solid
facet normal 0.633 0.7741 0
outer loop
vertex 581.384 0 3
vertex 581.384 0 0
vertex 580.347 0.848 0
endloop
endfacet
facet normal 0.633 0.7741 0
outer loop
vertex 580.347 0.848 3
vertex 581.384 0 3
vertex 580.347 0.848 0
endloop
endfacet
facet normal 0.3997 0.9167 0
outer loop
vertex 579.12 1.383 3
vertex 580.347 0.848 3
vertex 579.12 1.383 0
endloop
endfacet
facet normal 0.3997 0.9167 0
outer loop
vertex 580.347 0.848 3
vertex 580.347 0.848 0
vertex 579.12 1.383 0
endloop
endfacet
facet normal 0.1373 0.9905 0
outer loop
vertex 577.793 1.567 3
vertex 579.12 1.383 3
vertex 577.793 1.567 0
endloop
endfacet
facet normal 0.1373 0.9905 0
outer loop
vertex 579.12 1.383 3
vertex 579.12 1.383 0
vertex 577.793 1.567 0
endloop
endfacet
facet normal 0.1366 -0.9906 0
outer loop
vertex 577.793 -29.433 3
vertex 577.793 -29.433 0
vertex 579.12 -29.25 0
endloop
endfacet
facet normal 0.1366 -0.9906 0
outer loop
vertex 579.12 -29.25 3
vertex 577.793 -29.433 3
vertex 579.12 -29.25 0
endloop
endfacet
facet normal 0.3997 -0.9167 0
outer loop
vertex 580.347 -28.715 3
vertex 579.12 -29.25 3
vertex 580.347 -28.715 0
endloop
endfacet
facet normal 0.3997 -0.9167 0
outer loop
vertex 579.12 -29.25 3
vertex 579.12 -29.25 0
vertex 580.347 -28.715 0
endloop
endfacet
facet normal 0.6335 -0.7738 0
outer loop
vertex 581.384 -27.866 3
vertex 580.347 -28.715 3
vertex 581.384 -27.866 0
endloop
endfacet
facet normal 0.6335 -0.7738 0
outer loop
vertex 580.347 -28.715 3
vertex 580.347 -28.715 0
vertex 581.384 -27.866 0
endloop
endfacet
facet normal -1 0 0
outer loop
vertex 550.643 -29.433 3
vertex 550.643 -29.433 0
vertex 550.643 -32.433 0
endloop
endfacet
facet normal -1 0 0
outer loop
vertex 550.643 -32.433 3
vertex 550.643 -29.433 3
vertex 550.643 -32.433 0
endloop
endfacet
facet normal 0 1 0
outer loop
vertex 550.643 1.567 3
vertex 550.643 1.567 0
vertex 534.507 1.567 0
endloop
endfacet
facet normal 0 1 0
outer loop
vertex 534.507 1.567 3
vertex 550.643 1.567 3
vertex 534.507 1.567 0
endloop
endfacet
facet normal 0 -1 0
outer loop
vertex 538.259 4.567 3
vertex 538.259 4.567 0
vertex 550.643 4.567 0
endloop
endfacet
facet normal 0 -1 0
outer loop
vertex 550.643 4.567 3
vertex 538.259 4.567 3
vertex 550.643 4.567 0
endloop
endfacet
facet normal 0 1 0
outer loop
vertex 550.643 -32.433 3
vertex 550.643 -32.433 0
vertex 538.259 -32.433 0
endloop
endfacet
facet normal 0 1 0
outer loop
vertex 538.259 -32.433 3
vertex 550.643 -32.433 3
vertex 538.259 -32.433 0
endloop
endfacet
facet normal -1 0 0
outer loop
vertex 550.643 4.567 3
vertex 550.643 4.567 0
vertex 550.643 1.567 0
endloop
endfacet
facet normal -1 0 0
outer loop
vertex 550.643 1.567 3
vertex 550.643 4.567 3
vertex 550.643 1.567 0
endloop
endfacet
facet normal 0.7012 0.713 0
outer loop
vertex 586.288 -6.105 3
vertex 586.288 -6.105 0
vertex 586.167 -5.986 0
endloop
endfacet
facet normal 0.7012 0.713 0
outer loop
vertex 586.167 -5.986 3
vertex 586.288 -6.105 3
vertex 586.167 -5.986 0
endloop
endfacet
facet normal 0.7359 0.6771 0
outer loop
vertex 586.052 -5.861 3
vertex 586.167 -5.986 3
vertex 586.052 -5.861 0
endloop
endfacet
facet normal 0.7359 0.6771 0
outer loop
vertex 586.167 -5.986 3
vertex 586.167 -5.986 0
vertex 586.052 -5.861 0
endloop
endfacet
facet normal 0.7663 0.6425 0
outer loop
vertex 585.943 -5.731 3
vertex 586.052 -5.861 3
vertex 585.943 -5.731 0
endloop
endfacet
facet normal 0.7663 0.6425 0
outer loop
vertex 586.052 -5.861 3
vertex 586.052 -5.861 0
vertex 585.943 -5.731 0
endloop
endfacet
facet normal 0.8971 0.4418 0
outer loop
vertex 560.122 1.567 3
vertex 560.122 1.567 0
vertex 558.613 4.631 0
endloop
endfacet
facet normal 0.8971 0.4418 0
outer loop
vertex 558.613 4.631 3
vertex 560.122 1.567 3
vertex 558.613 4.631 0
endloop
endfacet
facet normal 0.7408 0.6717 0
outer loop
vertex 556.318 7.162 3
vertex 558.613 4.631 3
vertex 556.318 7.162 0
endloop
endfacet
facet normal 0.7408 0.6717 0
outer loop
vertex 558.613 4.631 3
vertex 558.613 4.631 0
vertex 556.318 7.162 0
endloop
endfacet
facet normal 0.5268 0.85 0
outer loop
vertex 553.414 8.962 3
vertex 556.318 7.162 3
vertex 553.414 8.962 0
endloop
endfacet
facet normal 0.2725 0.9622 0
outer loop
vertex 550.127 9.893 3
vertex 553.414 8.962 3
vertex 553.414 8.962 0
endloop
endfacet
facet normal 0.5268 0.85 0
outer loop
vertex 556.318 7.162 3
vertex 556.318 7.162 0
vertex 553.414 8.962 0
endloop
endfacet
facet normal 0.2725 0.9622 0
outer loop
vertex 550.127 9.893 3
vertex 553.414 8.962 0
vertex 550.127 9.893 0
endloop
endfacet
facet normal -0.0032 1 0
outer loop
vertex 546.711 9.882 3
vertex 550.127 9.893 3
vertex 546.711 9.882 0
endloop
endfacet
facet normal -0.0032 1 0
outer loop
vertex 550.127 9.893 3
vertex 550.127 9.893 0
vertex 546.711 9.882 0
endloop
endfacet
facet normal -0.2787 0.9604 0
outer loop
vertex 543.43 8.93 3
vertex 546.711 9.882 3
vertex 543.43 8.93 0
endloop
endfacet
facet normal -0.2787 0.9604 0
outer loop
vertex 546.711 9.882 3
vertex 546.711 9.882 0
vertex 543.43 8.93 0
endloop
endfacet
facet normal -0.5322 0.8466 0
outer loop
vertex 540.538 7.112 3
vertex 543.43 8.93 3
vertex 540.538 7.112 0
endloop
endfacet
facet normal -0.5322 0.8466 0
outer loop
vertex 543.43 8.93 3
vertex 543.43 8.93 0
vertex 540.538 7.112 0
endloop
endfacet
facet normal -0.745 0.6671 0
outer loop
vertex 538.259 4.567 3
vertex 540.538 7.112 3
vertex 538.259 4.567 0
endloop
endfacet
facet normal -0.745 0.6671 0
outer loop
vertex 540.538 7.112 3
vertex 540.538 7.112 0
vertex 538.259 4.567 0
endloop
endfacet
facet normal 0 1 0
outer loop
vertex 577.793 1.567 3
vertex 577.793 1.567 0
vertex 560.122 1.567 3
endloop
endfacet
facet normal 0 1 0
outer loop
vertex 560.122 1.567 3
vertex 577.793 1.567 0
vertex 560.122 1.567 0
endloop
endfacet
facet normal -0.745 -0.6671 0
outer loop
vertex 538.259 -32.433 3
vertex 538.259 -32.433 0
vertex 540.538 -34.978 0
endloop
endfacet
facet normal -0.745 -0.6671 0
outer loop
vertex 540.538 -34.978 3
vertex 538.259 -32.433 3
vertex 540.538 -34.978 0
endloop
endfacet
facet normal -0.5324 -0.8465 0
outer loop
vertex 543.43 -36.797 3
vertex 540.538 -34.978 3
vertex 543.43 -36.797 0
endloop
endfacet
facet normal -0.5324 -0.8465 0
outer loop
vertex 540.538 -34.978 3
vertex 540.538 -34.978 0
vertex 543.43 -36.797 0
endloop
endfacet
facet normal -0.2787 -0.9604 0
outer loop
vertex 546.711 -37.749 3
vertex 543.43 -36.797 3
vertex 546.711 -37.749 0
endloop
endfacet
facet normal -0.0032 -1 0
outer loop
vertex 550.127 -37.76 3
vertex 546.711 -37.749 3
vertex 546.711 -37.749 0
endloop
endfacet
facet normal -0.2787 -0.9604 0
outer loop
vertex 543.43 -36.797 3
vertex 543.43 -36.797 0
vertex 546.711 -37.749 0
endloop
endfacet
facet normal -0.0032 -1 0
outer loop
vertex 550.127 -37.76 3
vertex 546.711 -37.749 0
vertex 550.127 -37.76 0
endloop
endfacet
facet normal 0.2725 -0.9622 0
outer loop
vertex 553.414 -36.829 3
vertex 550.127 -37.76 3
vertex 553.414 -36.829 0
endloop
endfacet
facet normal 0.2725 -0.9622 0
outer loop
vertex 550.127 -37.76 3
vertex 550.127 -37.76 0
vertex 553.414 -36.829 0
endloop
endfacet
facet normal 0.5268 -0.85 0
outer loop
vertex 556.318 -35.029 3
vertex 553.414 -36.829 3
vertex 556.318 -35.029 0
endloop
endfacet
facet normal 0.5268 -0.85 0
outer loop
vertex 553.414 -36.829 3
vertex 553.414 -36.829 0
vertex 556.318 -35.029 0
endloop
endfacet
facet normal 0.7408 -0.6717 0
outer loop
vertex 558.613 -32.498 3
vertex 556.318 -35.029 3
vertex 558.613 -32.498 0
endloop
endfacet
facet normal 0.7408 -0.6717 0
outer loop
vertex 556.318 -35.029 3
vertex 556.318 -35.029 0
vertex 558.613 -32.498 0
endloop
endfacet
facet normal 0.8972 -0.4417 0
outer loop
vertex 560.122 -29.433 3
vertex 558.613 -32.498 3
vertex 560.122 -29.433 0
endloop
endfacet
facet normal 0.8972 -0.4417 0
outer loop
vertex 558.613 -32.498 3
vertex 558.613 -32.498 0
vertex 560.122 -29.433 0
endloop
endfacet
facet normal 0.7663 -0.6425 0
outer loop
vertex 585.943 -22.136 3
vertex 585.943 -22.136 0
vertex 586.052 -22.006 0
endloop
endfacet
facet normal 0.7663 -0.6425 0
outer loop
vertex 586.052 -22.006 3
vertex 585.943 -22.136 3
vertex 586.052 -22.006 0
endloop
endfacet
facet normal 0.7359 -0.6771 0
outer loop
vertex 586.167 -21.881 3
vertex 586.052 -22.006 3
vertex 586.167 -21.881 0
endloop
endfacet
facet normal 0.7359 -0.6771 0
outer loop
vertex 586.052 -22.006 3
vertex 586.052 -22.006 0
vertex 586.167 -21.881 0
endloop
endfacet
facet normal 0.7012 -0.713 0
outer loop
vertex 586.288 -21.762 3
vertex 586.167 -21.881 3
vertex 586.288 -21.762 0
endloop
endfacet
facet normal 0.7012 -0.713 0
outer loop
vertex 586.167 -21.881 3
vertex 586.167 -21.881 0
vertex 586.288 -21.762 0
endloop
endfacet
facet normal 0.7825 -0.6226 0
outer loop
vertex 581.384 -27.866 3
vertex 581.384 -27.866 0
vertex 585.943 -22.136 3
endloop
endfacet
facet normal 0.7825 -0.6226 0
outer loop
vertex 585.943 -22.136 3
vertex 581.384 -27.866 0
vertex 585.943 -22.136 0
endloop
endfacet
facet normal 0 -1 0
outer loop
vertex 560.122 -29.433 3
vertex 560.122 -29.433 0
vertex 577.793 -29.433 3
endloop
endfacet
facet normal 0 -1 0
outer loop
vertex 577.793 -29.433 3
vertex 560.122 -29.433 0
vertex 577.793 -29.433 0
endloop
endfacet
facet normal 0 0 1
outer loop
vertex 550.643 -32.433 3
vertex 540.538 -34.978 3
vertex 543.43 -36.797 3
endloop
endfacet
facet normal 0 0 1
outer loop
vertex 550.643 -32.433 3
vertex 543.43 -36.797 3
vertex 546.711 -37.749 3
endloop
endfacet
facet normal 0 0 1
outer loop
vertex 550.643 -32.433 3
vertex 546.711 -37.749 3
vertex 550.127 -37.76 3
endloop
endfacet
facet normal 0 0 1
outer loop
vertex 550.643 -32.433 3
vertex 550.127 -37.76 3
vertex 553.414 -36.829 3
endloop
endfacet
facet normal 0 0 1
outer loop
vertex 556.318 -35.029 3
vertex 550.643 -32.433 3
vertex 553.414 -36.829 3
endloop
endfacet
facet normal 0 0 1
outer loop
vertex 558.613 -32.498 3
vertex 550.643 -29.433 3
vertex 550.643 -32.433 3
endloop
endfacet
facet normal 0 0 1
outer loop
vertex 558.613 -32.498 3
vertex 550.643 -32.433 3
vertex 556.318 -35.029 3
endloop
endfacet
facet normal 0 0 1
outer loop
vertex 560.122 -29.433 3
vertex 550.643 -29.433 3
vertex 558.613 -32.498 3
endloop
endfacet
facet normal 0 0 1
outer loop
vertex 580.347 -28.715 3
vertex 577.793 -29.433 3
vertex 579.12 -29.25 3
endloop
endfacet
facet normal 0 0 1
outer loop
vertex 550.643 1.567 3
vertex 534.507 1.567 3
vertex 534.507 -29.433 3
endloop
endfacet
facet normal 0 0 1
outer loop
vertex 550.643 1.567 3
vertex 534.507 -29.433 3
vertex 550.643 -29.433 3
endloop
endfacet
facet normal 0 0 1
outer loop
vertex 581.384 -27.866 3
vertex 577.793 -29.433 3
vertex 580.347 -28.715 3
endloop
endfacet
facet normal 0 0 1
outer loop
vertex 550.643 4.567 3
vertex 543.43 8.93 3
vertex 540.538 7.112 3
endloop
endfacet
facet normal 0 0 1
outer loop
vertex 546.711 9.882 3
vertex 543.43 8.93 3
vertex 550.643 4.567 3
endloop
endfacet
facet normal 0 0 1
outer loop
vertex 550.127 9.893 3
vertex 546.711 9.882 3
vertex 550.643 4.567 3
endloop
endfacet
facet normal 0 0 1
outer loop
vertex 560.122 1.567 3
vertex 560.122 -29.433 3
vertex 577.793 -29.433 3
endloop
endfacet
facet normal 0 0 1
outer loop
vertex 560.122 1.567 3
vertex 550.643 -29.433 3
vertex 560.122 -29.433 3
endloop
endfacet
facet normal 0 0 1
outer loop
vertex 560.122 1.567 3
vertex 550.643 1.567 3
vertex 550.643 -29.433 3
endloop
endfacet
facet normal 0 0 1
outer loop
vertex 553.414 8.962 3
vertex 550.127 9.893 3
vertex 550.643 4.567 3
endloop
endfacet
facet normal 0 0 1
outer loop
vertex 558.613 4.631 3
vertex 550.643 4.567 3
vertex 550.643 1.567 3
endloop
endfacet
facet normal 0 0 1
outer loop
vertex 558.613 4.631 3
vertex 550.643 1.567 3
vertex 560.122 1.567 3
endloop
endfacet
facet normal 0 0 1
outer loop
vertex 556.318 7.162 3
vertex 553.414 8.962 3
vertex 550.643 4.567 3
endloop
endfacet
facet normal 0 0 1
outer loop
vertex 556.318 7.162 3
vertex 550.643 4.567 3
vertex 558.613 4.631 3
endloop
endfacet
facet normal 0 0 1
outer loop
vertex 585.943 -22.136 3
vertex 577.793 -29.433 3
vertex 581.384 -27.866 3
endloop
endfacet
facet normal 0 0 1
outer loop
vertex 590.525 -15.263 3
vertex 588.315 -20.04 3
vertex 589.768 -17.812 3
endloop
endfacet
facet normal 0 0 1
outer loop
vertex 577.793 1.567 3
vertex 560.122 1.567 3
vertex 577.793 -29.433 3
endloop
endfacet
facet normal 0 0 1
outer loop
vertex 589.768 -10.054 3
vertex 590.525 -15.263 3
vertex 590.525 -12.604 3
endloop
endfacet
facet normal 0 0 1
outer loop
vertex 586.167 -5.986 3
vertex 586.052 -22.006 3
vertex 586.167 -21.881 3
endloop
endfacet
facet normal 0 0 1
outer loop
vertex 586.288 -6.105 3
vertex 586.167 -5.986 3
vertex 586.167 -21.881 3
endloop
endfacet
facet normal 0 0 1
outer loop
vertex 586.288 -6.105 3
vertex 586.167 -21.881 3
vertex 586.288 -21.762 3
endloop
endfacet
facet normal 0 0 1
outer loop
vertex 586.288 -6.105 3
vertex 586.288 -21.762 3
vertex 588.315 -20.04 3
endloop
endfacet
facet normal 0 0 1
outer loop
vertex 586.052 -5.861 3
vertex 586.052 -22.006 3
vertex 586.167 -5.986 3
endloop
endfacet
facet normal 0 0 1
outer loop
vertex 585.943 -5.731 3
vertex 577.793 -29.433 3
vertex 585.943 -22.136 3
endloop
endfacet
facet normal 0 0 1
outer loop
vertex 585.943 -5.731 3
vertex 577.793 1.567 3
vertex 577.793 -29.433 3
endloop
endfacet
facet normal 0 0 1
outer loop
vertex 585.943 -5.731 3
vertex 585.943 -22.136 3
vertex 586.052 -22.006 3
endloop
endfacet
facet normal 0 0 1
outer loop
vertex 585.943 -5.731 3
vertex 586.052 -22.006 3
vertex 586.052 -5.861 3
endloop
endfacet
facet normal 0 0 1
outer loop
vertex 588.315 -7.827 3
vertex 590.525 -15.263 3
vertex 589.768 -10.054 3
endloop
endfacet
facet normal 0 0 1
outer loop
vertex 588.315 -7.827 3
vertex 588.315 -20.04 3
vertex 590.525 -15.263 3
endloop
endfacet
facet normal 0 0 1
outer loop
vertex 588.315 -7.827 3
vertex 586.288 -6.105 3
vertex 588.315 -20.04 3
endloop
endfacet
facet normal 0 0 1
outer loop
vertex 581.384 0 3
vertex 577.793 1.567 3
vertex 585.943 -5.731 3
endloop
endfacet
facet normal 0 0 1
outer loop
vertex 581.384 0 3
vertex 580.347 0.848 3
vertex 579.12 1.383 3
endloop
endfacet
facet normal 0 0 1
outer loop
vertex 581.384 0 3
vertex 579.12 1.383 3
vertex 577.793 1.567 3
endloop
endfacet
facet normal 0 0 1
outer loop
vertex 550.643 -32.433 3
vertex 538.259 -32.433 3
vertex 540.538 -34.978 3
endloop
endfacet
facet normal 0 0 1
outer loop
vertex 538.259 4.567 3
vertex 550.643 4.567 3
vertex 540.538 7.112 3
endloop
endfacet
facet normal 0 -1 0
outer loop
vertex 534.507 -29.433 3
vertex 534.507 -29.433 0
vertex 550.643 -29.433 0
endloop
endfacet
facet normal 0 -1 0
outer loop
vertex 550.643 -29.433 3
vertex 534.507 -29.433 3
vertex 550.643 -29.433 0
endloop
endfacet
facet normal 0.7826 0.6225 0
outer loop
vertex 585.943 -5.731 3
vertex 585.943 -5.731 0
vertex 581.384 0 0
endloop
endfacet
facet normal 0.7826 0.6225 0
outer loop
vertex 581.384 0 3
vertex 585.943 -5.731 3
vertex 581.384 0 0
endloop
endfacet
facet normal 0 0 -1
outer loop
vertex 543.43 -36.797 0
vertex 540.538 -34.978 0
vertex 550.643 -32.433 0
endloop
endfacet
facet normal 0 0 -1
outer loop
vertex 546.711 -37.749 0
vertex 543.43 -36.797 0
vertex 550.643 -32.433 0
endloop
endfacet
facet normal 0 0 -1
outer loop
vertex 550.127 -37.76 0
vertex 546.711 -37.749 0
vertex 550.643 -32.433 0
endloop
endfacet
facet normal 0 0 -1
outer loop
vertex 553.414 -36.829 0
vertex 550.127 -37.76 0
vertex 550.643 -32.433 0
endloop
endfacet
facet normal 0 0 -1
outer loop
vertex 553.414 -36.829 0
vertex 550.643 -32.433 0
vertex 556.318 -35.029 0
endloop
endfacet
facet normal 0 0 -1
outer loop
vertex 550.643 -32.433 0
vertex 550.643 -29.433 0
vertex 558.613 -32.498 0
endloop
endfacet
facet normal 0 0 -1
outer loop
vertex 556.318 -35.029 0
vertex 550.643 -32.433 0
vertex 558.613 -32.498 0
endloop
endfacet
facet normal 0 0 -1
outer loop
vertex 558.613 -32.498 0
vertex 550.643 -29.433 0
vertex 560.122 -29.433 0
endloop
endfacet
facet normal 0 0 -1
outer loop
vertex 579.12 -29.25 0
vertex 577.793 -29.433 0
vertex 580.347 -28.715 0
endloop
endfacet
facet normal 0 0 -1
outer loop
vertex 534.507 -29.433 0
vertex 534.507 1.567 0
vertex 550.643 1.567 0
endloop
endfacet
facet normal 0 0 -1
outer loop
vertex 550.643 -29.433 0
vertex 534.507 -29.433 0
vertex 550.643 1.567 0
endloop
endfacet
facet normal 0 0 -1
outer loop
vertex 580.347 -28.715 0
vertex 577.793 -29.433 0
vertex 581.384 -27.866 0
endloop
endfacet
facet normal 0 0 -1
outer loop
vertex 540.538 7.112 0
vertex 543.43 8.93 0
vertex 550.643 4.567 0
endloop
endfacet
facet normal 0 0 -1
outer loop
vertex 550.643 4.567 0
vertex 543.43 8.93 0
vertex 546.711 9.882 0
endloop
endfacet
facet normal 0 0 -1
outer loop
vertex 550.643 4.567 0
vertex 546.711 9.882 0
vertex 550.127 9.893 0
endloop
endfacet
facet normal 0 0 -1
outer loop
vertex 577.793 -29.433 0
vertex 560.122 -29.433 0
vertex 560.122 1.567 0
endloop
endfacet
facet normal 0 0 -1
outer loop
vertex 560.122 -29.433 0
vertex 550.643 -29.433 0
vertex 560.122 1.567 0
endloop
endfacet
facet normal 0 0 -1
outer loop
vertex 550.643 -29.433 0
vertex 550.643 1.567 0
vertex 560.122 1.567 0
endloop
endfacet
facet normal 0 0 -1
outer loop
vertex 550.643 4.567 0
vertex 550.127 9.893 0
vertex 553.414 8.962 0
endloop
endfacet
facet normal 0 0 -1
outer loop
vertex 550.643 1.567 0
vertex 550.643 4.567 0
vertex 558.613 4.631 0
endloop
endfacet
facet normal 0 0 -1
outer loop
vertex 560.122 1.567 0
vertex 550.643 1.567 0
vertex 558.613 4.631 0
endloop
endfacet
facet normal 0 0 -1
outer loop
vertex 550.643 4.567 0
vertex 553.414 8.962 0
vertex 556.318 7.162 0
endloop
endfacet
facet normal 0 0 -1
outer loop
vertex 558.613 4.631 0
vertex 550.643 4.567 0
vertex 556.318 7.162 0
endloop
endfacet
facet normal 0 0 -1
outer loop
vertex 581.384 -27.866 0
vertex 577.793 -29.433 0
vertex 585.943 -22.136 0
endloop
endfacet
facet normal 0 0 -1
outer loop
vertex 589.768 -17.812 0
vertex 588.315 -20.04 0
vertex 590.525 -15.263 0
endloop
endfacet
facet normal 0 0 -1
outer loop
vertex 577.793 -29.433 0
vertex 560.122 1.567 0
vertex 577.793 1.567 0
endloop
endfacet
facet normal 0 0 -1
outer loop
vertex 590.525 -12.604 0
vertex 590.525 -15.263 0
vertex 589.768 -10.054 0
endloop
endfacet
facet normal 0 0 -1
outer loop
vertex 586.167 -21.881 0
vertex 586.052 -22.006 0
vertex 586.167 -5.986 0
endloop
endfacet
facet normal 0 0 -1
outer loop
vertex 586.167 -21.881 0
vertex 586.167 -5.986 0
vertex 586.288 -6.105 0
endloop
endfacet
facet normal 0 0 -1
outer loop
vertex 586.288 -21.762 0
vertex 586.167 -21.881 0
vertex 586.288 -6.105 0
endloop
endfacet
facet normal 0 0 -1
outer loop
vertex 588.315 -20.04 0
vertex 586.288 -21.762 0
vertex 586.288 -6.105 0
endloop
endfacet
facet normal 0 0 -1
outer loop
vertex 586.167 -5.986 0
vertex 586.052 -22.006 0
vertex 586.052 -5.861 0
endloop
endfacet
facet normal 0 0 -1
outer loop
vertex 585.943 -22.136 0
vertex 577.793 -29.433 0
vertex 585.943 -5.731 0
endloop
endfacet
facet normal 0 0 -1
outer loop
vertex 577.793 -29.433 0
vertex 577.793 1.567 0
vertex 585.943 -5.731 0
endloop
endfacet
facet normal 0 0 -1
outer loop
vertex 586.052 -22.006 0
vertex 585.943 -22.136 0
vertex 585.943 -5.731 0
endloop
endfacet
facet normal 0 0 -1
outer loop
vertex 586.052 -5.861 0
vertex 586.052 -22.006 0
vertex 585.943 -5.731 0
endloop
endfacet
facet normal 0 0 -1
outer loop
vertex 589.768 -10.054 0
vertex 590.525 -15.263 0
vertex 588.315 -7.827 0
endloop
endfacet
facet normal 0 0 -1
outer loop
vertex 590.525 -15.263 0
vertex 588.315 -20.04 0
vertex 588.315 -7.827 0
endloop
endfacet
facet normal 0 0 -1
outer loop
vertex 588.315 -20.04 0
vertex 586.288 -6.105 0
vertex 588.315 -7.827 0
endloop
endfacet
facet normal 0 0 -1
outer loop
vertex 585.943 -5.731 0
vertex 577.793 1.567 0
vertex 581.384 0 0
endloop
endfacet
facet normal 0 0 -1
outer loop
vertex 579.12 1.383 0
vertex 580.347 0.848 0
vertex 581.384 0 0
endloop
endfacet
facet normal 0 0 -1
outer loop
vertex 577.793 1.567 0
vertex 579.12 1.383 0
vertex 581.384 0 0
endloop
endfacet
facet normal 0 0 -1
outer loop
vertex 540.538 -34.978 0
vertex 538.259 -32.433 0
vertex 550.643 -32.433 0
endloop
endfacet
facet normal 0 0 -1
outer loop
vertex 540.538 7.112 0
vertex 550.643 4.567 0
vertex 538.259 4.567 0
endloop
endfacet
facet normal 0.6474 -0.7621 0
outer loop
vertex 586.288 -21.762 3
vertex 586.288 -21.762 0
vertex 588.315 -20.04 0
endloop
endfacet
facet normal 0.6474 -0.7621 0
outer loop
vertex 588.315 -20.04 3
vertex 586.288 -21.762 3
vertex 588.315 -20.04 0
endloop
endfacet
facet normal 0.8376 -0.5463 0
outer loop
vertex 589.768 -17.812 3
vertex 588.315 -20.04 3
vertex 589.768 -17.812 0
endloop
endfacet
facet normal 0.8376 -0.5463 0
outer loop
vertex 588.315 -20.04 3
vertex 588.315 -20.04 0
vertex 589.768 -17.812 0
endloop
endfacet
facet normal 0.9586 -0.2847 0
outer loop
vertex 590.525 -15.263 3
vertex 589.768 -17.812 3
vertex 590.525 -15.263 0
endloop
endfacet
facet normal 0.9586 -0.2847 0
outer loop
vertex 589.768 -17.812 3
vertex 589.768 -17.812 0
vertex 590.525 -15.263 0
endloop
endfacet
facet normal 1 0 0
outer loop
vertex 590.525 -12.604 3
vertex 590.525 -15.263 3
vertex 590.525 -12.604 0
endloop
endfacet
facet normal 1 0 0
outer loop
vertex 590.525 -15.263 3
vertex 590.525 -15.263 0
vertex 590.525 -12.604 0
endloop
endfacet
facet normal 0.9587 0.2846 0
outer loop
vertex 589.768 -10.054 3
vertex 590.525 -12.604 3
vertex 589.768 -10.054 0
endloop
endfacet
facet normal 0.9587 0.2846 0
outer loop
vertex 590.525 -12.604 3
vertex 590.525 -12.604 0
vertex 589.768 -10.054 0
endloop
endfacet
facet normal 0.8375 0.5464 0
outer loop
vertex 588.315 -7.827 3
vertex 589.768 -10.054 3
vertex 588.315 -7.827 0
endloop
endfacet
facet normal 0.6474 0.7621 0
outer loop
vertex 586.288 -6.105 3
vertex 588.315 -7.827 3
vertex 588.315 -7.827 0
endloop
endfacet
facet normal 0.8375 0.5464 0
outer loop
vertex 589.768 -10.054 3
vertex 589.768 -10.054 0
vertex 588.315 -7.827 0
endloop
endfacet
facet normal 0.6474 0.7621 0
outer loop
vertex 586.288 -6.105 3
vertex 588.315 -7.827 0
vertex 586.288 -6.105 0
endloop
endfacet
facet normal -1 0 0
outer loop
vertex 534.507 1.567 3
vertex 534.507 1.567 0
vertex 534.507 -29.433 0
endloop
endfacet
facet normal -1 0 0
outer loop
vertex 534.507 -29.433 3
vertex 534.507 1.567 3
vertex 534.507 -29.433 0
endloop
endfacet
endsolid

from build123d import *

# Parameters (mm, degrees)
BASE_EXTRUDE_DEPTH = 3


with BuildPart() as part:
    # Sketch1 → Base-Extrude (new body)
    with BuildSketch(Plane.XY):
        with BuildLine():
            Line((534.507066227, 1.566585982), (534.507066227, -29.433414018))
            Line((534.507066227, -29.433414018), (550.643129996, -29.433414018))
            Line((550.643129996, -29.433414018), (550.643129996, -32.433414018))
            Line((550.643129996, -32.433414018), (538.258588448, -32.433414018))
            ThreePointArc((538.258588448, -32.433414018), (550.12702098, -37.759556083), (560.122161718, -29.433414018))
            Line((560.122161718, -29.433414018), (577.454155209, -29.433414018))
            Line((577.454155209, -29.433414018), (577.793445205, -29.433414018))
            ThreePointArc((577.793445205, -29.433414018), (579.752044999, -29.024576285), (581.383534897, -27.866343942))
            Line((581.383534897, -27.866343942), (585.943497105, -22.135687625))
            ThreePointArc((585.943497105, -22.135687625), (586.10909179, -21.942450413), (586.288300693, -21.761767294))
            ThreePointArc((586.288300693, -21.761767294), (590.621491518, -13.933414018), (586.288300693, -6.105060742))
            ThreePointArc((586.288300693, -6.105060742), (586.10909179, -5.924377623), (585.943497105, -5.731140411))
            Line((585.943497105, -5.731140411), (581.383534897, -0.000484094))
            ThreePointArc((581.383534897, -0.000484094), (579.752044999, 1.157748249), (577.793445205, 1.566585982))
            Line((577.793445205, 1.566585982), (577.454155209, 1.566585982))
            Line((577.454155209, 1.566585982), (560.122161718, 1.566585982))
            ThreePointArc((560.122161718, 1.566585982), (550.12702098, 9.892728047), (538.258588448, 4.566585982))
            Line((538.258588448, 4.566585982), (550.643129996, 4.566585982))
            Line((550.643129996, 4.566585982), (550.643129996, 1.566585982))
            Line((550.643129996, 1.566585982), (534.507066227, 1.566585982))
        make_face()
    extrude(amount=BASE_EXTRUDE_DEPTH)


solid = part.part
